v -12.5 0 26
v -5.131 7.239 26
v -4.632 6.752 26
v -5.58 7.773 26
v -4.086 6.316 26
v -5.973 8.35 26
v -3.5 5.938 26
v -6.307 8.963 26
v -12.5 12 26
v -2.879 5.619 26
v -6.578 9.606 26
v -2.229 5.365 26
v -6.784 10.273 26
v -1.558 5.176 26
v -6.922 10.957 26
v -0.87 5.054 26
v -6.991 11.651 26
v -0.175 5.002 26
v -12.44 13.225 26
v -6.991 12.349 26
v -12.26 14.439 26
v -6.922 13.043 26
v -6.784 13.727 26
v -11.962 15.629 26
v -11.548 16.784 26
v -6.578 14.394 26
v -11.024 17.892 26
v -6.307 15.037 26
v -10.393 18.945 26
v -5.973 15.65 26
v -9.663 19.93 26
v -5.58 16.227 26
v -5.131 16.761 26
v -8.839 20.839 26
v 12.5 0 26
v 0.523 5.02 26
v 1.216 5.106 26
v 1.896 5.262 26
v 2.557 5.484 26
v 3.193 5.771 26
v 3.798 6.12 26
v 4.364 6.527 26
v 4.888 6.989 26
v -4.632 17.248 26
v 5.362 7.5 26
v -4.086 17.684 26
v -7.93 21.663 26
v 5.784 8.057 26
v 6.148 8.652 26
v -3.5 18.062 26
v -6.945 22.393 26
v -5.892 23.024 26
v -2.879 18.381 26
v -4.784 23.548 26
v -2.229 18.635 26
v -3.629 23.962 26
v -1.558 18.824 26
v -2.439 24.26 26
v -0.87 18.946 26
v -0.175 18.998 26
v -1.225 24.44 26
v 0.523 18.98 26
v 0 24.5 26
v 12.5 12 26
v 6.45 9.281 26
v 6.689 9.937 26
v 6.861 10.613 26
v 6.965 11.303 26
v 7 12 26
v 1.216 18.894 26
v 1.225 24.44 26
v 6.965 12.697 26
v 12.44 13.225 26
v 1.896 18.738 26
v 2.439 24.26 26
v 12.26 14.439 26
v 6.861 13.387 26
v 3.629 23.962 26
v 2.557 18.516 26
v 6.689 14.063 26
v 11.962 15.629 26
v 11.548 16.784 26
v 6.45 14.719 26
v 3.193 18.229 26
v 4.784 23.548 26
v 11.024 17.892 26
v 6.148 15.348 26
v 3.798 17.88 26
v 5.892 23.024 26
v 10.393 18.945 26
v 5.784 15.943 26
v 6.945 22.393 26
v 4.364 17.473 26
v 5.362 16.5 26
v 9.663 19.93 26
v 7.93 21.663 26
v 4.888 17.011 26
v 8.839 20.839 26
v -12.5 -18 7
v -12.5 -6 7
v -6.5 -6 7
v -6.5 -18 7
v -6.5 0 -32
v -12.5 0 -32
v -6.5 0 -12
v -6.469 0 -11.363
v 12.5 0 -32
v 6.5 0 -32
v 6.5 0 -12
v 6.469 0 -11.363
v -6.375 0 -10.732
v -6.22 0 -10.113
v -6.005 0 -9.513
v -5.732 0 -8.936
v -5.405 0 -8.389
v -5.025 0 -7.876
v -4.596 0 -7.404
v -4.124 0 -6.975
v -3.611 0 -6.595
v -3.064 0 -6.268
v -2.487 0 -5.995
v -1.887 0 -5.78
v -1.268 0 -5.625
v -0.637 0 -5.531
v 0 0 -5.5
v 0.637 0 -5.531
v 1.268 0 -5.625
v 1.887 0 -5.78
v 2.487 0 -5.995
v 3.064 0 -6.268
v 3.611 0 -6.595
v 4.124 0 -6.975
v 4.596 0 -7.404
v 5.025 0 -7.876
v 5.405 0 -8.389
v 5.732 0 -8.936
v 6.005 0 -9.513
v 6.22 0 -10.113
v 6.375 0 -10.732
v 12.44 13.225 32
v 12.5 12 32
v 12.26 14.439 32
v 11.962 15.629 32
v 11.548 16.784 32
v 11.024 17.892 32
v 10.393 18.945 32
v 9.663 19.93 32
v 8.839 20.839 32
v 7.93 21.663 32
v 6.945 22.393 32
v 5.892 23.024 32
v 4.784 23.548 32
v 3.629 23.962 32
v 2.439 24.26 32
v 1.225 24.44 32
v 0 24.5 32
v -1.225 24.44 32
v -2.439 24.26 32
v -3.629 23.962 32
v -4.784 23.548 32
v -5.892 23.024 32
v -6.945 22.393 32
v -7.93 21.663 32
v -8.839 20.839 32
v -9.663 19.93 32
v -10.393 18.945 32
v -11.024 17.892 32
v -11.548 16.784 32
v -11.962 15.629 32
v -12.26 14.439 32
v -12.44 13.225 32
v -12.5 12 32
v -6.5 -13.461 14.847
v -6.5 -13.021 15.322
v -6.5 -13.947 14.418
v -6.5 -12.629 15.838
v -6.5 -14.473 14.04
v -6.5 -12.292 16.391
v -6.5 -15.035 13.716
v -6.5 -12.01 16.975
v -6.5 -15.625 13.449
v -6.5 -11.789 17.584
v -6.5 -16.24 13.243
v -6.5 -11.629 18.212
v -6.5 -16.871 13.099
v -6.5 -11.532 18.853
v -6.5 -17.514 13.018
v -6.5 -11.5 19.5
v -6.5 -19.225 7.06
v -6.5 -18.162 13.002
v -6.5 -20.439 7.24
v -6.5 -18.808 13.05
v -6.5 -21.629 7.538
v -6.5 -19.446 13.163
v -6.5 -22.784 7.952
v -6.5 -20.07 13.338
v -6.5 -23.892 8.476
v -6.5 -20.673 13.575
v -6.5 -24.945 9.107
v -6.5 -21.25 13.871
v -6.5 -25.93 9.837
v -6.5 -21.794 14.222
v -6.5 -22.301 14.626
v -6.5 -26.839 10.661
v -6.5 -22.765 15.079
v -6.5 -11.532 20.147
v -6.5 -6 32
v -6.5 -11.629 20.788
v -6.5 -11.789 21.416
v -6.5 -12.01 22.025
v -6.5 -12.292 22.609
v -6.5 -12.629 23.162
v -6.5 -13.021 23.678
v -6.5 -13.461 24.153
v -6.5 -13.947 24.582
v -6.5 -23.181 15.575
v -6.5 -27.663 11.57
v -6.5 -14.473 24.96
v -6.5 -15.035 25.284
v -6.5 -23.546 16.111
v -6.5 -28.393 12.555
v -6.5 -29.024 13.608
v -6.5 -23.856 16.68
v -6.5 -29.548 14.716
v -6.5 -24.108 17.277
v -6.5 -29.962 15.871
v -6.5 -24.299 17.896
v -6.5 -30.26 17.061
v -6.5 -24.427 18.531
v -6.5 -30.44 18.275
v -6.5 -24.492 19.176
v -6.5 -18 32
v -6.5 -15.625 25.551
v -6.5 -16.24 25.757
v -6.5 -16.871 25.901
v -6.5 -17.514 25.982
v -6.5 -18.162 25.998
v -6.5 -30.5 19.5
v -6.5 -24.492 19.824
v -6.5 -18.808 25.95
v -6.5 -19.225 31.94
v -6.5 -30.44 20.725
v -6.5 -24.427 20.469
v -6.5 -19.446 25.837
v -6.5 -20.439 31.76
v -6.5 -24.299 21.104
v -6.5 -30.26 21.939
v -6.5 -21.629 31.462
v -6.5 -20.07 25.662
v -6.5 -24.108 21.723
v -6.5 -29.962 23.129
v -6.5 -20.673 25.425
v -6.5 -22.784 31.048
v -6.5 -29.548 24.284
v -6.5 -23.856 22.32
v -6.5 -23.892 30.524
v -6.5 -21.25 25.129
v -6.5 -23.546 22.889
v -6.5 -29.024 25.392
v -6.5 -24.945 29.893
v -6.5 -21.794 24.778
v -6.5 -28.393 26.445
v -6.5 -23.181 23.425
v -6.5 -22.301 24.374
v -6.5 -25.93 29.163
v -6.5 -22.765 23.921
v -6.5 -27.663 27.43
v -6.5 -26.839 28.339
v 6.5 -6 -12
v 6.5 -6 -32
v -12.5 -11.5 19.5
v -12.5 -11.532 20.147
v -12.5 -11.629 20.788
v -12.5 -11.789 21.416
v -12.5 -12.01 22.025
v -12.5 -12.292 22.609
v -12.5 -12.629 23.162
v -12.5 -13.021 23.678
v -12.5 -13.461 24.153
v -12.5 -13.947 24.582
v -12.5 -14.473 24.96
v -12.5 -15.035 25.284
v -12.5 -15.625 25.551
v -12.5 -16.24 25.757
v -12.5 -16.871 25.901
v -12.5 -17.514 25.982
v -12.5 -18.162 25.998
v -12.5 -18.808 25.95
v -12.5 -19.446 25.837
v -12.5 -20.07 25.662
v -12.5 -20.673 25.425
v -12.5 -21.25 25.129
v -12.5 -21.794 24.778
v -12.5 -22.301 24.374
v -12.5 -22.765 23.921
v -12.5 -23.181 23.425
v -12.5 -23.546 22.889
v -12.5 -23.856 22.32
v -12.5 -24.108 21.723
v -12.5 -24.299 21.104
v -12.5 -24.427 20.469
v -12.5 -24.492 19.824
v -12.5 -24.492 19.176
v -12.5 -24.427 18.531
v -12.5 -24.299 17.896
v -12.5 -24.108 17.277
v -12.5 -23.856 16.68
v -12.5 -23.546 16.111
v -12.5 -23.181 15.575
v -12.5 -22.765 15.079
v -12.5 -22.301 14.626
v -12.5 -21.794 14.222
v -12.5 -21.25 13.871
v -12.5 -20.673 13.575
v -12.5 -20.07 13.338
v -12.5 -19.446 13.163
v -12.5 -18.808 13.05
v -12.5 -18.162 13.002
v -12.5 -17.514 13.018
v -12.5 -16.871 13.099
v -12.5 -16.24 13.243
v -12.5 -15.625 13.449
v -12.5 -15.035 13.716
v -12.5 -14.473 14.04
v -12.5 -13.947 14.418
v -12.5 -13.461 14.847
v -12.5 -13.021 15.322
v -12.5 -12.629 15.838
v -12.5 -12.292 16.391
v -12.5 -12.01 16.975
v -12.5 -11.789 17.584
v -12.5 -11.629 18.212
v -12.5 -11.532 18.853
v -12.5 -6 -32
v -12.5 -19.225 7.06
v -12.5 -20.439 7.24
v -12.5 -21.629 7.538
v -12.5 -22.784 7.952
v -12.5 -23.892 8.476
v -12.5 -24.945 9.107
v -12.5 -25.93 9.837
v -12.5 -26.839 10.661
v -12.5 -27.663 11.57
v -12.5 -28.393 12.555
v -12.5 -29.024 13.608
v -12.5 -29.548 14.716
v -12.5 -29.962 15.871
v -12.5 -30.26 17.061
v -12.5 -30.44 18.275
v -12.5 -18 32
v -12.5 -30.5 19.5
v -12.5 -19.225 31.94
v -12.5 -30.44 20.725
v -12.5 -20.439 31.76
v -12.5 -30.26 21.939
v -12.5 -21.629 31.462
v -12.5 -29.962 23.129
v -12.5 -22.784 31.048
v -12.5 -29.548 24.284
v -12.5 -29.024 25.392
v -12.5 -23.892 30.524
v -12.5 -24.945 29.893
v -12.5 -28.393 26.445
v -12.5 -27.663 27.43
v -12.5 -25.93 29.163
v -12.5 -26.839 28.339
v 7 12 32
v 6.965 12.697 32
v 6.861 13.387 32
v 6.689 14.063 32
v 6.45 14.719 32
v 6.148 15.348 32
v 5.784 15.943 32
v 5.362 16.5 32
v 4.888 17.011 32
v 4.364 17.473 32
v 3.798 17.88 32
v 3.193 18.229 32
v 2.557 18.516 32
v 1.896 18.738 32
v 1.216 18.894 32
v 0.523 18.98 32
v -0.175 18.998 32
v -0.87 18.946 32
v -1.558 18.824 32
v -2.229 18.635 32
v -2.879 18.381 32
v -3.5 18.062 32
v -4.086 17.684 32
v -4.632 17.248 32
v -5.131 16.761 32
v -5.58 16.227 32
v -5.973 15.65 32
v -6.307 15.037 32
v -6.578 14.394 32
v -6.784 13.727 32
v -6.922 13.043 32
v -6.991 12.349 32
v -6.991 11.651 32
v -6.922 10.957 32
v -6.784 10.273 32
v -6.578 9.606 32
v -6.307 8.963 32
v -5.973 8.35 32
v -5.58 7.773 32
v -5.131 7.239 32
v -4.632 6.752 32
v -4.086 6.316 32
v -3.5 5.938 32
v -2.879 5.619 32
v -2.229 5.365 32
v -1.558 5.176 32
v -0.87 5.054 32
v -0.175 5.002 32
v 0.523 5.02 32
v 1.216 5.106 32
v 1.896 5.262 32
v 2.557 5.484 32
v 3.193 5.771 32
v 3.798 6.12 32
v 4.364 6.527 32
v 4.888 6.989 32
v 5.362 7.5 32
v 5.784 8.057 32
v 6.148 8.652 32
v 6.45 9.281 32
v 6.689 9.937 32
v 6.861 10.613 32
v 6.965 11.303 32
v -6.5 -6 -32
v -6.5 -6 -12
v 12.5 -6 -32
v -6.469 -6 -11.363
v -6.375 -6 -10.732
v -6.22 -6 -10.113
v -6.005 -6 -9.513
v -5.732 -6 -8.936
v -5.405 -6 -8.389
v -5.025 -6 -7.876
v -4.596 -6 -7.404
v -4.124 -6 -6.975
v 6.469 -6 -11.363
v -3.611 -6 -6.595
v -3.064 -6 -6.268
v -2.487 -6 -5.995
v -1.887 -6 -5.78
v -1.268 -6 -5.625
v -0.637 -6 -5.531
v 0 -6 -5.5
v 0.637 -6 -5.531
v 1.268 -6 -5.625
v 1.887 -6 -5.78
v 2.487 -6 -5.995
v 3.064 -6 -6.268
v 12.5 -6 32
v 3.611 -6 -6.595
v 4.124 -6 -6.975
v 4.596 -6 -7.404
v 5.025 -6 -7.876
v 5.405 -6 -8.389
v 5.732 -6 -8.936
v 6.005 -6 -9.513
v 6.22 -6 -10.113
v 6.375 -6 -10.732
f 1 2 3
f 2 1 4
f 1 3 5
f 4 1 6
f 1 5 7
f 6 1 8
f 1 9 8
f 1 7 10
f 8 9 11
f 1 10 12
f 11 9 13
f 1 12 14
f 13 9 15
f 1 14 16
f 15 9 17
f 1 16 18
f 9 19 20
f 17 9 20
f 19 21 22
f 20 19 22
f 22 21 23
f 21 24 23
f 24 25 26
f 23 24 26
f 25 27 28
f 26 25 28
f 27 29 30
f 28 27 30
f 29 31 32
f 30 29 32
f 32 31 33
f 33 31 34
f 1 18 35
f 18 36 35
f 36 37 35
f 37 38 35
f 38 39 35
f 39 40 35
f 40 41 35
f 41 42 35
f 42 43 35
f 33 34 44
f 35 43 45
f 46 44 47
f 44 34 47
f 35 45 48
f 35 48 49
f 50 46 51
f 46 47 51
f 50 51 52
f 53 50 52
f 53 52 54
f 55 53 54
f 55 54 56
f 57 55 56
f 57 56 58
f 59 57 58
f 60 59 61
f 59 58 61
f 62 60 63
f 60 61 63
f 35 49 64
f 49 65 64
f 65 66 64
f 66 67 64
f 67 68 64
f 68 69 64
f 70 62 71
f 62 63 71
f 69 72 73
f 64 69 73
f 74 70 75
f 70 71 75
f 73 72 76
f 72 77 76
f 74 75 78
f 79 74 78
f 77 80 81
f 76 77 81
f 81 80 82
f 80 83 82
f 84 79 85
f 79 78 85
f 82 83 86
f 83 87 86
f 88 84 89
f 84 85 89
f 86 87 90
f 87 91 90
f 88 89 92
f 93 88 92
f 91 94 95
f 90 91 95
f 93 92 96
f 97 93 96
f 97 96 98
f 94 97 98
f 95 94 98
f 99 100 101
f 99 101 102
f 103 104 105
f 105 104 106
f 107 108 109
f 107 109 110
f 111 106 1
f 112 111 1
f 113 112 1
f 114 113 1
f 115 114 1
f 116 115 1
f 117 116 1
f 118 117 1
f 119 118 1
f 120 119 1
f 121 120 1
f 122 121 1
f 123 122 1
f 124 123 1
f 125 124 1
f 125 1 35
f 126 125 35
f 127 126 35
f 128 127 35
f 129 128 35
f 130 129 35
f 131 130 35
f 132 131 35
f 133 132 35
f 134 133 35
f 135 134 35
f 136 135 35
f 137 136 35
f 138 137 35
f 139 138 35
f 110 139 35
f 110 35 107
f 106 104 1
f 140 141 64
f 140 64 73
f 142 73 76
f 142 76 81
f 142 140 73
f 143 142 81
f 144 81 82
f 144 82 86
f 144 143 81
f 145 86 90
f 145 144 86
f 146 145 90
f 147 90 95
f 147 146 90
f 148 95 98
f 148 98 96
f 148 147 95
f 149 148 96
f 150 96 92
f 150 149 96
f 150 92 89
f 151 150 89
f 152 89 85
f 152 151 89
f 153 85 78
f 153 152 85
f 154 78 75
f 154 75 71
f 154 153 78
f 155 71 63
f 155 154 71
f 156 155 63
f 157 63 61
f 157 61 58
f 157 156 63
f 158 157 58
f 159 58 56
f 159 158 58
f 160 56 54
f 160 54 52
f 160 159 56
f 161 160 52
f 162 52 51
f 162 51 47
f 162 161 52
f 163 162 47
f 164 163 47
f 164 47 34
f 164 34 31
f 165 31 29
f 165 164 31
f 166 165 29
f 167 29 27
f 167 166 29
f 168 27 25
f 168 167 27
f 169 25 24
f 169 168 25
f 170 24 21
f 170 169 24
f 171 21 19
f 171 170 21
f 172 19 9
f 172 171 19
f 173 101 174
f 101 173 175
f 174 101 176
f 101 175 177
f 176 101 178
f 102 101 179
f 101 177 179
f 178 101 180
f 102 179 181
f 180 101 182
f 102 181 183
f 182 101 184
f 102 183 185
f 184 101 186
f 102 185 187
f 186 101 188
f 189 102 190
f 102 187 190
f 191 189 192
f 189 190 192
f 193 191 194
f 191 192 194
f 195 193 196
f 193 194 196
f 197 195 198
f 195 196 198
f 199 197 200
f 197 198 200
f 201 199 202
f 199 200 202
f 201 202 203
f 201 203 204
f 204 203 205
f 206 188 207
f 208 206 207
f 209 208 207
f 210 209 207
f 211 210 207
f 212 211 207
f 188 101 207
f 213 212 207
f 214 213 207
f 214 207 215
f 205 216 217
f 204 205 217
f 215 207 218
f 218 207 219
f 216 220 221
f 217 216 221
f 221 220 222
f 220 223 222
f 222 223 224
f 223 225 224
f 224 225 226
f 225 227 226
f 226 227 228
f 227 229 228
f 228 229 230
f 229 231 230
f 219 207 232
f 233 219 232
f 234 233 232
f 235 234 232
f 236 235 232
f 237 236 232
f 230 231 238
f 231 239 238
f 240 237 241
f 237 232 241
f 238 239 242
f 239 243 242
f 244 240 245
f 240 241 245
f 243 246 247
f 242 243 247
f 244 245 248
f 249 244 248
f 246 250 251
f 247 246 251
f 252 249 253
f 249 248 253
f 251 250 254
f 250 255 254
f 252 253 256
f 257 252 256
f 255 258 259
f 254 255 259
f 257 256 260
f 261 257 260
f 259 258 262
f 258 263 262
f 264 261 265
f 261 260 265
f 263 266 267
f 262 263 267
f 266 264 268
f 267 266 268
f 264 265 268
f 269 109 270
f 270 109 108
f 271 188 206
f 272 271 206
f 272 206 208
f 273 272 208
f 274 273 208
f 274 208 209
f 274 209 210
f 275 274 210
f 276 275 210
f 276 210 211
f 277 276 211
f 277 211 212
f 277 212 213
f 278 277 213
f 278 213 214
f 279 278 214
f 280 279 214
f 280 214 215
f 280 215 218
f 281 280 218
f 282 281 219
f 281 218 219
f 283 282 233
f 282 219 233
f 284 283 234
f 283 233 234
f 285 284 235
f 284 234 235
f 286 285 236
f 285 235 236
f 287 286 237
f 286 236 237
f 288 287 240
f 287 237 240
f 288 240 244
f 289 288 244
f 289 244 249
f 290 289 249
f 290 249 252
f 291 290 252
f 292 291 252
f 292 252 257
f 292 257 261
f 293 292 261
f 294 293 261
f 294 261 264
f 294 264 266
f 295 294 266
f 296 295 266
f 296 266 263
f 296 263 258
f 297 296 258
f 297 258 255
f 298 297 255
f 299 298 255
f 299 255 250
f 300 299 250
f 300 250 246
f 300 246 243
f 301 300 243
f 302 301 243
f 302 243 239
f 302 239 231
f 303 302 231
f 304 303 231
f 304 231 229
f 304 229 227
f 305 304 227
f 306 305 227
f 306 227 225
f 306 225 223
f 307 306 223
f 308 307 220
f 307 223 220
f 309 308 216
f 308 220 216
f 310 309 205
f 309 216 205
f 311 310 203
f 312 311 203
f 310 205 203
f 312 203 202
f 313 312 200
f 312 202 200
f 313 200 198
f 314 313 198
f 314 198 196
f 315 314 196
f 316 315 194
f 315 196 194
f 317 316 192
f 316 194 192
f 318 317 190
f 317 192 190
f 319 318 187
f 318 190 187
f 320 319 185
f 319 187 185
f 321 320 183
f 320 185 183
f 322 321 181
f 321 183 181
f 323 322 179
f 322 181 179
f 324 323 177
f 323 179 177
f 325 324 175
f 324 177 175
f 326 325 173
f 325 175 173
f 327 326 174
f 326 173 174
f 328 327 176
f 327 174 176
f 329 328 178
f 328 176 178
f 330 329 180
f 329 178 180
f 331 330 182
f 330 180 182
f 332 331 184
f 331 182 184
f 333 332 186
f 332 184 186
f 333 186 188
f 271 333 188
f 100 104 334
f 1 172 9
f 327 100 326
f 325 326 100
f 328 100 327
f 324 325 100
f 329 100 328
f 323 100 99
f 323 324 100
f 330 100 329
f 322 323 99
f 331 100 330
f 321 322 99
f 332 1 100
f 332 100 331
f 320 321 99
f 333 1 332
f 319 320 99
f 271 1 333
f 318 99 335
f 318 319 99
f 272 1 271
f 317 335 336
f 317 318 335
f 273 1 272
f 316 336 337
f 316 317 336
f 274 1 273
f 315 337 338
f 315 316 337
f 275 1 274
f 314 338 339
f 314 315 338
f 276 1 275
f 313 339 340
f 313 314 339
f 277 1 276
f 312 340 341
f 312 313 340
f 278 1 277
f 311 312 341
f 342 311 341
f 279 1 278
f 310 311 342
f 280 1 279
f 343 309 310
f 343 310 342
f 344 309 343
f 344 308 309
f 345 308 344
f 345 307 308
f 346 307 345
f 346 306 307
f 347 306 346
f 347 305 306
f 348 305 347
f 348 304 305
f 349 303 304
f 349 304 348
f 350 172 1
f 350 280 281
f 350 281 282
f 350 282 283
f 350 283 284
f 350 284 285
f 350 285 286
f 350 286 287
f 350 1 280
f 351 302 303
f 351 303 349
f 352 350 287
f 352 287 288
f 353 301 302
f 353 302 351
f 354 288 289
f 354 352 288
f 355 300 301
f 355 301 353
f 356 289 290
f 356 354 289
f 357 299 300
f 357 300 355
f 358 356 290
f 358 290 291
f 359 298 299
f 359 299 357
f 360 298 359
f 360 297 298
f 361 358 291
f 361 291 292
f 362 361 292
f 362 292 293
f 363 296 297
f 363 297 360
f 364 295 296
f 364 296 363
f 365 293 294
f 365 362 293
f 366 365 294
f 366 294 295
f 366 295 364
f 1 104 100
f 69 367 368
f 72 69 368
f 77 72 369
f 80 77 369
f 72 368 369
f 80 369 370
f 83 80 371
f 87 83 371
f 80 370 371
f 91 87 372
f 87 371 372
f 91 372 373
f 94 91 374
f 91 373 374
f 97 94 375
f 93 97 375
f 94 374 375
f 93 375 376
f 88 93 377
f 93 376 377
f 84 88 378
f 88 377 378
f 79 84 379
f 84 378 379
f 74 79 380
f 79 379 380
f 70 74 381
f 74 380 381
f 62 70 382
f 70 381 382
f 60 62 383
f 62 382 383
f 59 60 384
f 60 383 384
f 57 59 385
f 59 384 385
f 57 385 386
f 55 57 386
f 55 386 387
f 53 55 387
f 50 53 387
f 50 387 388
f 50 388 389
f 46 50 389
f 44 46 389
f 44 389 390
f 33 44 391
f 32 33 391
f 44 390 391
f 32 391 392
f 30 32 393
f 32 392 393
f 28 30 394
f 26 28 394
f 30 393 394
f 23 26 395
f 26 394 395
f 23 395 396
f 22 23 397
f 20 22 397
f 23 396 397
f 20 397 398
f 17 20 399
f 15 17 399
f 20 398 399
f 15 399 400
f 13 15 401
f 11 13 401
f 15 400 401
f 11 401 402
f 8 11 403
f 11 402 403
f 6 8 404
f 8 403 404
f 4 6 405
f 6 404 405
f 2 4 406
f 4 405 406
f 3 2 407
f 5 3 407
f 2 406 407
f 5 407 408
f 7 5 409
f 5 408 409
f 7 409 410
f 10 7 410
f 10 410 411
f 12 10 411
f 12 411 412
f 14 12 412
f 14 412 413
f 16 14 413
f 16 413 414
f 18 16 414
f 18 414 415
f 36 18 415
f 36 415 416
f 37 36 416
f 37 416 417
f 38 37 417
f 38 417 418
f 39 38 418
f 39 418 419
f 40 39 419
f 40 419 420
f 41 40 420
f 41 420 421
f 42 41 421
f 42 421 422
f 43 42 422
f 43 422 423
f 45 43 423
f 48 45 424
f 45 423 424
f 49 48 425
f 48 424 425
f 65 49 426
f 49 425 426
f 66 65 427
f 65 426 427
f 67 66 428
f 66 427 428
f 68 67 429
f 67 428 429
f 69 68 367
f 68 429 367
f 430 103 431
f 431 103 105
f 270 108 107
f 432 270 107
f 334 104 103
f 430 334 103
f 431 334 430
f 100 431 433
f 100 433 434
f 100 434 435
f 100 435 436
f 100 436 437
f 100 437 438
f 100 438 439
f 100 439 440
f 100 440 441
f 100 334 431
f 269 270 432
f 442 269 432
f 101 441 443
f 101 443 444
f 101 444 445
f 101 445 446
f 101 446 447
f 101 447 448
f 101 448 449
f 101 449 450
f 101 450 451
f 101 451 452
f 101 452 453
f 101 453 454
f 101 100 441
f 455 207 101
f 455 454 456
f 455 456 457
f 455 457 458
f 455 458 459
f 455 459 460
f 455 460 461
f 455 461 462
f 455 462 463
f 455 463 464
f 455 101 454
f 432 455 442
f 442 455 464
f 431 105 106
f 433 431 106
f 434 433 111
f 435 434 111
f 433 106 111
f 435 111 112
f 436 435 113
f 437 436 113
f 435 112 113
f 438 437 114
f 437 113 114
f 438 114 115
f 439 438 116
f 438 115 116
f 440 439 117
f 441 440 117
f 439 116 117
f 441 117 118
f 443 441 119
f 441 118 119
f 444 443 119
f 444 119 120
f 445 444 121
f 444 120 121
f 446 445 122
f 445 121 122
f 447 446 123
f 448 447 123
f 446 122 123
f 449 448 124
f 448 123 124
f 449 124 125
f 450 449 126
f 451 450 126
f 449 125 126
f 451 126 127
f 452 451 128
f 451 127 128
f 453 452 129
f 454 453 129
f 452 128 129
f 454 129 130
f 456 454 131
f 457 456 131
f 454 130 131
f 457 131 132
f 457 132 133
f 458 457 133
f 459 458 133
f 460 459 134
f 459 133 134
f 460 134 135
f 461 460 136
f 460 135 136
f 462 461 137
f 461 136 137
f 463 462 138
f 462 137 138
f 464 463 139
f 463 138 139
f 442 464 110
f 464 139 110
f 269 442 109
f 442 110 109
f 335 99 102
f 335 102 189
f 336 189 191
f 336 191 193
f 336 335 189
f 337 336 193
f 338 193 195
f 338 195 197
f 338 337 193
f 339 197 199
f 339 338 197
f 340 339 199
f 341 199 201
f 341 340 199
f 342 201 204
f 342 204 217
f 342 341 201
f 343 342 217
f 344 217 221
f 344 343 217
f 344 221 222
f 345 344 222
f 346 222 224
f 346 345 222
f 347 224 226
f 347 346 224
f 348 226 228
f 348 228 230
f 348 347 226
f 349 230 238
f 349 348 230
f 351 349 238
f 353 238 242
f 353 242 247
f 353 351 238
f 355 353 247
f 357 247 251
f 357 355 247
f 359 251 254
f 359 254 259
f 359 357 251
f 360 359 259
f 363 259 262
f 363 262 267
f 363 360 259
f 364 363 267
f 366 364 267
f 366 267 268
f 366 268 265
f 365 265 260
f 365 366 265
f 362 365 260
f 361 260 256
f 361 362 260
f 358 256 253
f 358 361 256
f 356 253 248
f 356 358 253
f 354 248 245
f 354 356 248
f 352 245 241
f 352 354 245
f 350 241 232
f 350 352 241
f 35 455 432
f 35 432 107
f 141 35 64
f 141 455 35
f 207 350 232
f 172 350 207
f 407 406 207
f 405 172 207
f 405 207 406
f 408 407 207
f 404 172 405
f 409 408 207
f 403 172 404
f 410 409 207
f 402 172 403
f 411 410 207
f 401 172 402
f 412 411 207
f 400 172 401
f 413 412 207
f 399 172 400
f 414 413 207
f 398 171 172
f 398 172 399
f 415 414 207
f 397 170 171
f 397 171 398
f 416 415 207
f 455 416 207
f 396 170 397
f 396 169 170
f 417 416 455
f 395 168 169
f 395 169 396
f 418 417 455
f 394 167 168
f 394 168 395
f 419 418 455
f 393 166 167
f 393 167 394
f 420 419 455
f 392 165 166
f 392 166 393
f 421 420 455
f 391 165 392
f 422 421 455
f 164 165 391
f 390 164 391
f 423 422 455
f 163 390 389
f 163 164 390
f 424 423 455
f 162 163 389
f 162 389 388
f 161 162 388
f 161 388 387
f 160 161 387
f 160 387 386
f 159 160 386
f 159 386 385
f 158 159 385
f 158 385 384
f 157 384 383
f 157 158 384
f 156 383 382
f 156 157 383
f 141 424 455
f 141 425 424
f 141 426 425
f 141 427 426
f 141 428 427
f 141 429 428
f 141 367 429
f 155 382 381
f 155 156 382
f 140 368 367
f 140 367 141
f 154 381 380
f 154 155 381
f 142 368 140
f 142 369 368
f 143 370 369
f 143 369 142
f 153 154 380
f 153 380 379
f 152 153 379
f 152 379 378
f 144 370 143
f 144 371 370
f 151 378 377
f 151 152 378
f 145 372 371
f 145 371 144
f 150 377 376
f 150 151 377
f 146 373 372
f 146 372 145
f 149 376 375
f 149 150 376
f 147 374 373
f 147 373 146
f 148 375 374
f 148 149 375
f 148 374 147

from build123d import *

# Parameters (mm, degrees)
F1_DEPTH = 6
F2_R     = 7
F3_DEPTH = 6
F4_W     = 12
F4_H     = 25
F5_DEPTH = 6
F6_D     = 13


with BuildPart() as f1:
    # F0 (on Front) → F1 (new body)
    with BuildSketch(Plane.XZ):
        with BuildLine():
            Line((6.5, -32), (12.5, -32))
            Line((12.5, -32), (12.5, 32))
            Line((12.5, 32), (-12.5, 32))
            Line((-12.5, 32), (-12.5, -32))
            Line((-12.5, -32), (-6.5, -32))
            Line((-6.5, -32), (-6.5, -12))
            ThreePointArc((-6.5, -12), (0, -5.5), (6.5, -12))
            Line((6.5, -12), (6.5, -32))
        make_face()
    extrude(amount=F1_DEPTH)

    # F2 (on face) → F3 (join)
    with BuildSketch(Plane.XY.offset(32)):
        with BuildLine():
            Line((-12.5, 0), (12.5, 0))
            Line((12.5, 0), (12.5, 12))
            ThreePointArc((12.5, 12), (0, 24.5), (-12.5, 12))
            Line((-12.5, 12), (-12.5, 0))
        make_face()
        with Locations((0, 12)):
            Circle(F2_R, mode=Mode.SUBTRACT)
    extrude(amount=-F3_DEPTH)

    # F4 (on face) → F5 (join)
    with BuildSketch(Plane(origin=(-12.5, 0, 0), x_dir=(0, -1, 0), z_dir=(-1, 0, 0))):
        with Locations((12, 19.5)):
            Rectangle(F4_W, F4_H)
        with BuildLine():
            ThreePointArc((18, 7), (30.5, 19.5), (18, 32))
            Line((18, 32), (18, 7))
        make_face()
    extrude(amount=-F5_DEPTH)

    # F6 (through all)
    with Locations(Plane(origin=(-12.5, 0, 0), x_dir=(0, -1, 0), z_dir=(-1, 0, 0))):
        with Locations((18, 19.5)):
            Hole(F6_D / 2)


solid = f1.part
